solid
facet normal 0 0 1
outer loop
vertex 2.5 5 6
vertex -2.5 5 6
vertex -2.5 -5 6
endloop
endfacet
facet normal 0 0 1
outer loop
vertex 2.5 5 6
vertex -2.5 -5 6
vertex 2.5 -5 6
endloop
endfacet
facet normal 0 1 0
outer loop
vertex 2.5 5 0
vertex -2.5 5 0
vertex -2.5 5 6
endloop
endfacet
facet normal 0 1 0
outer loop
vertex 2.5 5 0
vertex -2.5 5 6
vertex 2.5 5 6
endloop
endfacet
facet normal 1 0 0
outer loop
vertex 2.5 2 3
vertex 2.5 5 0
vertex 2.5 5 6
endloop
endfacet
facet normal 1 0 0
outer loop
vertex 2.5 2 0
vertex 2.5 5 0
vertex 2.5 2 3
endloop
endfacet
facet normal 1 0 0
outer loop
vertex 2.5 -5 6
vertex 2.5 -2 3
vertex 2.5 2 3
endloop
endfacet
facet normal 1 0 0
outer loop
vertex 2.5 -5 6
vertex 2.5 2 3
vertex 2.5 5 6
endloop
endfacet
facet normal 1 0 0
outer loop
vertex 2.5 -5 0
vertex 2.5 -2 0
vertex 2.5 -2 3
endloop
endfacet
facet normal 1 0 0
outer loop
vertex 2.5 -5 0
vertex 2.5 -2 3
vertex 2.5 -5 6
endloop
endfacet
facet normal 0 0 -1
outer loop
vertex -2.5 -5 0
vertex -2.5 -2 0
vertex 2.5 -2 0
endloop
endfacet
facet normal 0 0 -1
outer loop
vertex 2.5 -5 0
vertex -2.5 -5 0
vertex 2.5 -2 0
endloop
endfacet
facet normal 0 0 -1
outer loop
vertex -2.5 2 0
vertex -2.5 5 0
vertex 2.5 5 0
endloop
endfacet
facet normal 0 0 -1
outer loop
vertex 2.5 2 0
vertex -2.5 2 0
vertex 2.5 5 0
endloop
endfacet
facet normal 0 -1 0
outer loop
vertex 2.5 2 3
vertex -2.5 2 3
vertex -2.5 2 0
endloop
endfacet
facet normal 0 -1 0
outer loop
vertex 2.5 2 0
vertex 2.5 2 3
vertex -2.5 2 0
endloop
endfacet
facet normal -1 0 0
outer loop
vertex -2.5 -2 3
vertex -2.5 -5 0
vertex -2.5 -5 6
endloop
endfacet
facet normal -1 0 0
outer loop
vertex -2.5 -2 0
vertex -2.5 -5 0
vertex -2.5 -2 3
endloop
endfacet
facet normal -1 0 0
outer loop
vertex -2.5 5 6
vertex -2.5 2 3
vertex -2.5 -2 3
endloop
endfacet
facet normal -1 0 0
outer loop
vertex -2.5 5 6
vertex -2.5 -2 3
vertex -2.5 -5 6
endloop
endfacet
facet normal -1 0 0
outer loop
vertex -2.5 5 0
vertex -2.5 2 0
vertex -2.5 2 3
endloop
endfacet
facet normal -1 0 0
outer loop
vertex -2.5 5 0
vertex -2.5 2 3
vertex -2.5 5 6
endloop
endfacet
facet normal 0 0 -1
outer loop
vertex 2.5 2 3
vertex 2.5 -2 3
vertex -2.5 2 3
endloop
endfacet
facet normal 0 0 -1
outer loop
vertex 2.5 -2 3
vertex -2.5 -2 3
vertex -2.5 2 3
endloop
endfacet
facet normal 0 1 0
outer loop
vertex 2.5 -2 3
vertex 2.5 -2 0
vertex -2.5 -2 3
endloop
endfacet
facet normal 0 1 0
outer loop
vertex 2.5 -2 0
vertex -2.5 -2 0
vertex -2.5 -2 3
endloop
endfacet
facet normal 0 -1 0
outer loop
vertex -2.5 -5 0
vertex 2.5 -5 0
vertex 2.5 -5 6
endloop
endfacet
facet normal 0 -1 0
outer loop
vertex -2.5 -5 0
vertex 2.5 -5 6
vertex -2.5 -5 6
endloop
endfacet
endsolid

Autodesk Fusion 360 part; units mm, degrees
sketch "Sketch1" plane through (0, 0, 0) normal (0, 0, 1) x (1, 0, 0)
  line L0 (-2.5, 5) -> (2.5, 5)
  line L1 (2.5, 5) -> (2.5, -5)
  line L2 (2.5, -5) -> (-2.5, -5)
  line L3 (-2.5, -5) -> (-2.5, 5)
  line L4 (-2.5, 5) -> (2.5, -5) construction
  line L5 (2.5, 5) -> (-2.5, -5) construction
  dimension "d1" = 5
  dimension "d2" = 10
extrude "Extrude1" add sketch "Sketch1" along normal blind 6
ref_plane "WorkPlane1" through (-2.5, 0, 3) normal (-1, 0, 0) x (0, -1, 0)
sketch "Sketch2" plane through (-2.5, 0, 0) normal (-1, 0, 0) x (0, -1, 0)
  line L0 (-2, 0) -> (2, 0)
  line L1 (2, 0) -> (2, 3)
  line L2 (2, 3) -> (-2, 3)
  line L3 (-2, 3) -> (-2, 0)
  dimension "d6" = 4
  dimension "d7" = 3
extrude "Extrude2" cut sketch "Sketch2" against normal blind 6
